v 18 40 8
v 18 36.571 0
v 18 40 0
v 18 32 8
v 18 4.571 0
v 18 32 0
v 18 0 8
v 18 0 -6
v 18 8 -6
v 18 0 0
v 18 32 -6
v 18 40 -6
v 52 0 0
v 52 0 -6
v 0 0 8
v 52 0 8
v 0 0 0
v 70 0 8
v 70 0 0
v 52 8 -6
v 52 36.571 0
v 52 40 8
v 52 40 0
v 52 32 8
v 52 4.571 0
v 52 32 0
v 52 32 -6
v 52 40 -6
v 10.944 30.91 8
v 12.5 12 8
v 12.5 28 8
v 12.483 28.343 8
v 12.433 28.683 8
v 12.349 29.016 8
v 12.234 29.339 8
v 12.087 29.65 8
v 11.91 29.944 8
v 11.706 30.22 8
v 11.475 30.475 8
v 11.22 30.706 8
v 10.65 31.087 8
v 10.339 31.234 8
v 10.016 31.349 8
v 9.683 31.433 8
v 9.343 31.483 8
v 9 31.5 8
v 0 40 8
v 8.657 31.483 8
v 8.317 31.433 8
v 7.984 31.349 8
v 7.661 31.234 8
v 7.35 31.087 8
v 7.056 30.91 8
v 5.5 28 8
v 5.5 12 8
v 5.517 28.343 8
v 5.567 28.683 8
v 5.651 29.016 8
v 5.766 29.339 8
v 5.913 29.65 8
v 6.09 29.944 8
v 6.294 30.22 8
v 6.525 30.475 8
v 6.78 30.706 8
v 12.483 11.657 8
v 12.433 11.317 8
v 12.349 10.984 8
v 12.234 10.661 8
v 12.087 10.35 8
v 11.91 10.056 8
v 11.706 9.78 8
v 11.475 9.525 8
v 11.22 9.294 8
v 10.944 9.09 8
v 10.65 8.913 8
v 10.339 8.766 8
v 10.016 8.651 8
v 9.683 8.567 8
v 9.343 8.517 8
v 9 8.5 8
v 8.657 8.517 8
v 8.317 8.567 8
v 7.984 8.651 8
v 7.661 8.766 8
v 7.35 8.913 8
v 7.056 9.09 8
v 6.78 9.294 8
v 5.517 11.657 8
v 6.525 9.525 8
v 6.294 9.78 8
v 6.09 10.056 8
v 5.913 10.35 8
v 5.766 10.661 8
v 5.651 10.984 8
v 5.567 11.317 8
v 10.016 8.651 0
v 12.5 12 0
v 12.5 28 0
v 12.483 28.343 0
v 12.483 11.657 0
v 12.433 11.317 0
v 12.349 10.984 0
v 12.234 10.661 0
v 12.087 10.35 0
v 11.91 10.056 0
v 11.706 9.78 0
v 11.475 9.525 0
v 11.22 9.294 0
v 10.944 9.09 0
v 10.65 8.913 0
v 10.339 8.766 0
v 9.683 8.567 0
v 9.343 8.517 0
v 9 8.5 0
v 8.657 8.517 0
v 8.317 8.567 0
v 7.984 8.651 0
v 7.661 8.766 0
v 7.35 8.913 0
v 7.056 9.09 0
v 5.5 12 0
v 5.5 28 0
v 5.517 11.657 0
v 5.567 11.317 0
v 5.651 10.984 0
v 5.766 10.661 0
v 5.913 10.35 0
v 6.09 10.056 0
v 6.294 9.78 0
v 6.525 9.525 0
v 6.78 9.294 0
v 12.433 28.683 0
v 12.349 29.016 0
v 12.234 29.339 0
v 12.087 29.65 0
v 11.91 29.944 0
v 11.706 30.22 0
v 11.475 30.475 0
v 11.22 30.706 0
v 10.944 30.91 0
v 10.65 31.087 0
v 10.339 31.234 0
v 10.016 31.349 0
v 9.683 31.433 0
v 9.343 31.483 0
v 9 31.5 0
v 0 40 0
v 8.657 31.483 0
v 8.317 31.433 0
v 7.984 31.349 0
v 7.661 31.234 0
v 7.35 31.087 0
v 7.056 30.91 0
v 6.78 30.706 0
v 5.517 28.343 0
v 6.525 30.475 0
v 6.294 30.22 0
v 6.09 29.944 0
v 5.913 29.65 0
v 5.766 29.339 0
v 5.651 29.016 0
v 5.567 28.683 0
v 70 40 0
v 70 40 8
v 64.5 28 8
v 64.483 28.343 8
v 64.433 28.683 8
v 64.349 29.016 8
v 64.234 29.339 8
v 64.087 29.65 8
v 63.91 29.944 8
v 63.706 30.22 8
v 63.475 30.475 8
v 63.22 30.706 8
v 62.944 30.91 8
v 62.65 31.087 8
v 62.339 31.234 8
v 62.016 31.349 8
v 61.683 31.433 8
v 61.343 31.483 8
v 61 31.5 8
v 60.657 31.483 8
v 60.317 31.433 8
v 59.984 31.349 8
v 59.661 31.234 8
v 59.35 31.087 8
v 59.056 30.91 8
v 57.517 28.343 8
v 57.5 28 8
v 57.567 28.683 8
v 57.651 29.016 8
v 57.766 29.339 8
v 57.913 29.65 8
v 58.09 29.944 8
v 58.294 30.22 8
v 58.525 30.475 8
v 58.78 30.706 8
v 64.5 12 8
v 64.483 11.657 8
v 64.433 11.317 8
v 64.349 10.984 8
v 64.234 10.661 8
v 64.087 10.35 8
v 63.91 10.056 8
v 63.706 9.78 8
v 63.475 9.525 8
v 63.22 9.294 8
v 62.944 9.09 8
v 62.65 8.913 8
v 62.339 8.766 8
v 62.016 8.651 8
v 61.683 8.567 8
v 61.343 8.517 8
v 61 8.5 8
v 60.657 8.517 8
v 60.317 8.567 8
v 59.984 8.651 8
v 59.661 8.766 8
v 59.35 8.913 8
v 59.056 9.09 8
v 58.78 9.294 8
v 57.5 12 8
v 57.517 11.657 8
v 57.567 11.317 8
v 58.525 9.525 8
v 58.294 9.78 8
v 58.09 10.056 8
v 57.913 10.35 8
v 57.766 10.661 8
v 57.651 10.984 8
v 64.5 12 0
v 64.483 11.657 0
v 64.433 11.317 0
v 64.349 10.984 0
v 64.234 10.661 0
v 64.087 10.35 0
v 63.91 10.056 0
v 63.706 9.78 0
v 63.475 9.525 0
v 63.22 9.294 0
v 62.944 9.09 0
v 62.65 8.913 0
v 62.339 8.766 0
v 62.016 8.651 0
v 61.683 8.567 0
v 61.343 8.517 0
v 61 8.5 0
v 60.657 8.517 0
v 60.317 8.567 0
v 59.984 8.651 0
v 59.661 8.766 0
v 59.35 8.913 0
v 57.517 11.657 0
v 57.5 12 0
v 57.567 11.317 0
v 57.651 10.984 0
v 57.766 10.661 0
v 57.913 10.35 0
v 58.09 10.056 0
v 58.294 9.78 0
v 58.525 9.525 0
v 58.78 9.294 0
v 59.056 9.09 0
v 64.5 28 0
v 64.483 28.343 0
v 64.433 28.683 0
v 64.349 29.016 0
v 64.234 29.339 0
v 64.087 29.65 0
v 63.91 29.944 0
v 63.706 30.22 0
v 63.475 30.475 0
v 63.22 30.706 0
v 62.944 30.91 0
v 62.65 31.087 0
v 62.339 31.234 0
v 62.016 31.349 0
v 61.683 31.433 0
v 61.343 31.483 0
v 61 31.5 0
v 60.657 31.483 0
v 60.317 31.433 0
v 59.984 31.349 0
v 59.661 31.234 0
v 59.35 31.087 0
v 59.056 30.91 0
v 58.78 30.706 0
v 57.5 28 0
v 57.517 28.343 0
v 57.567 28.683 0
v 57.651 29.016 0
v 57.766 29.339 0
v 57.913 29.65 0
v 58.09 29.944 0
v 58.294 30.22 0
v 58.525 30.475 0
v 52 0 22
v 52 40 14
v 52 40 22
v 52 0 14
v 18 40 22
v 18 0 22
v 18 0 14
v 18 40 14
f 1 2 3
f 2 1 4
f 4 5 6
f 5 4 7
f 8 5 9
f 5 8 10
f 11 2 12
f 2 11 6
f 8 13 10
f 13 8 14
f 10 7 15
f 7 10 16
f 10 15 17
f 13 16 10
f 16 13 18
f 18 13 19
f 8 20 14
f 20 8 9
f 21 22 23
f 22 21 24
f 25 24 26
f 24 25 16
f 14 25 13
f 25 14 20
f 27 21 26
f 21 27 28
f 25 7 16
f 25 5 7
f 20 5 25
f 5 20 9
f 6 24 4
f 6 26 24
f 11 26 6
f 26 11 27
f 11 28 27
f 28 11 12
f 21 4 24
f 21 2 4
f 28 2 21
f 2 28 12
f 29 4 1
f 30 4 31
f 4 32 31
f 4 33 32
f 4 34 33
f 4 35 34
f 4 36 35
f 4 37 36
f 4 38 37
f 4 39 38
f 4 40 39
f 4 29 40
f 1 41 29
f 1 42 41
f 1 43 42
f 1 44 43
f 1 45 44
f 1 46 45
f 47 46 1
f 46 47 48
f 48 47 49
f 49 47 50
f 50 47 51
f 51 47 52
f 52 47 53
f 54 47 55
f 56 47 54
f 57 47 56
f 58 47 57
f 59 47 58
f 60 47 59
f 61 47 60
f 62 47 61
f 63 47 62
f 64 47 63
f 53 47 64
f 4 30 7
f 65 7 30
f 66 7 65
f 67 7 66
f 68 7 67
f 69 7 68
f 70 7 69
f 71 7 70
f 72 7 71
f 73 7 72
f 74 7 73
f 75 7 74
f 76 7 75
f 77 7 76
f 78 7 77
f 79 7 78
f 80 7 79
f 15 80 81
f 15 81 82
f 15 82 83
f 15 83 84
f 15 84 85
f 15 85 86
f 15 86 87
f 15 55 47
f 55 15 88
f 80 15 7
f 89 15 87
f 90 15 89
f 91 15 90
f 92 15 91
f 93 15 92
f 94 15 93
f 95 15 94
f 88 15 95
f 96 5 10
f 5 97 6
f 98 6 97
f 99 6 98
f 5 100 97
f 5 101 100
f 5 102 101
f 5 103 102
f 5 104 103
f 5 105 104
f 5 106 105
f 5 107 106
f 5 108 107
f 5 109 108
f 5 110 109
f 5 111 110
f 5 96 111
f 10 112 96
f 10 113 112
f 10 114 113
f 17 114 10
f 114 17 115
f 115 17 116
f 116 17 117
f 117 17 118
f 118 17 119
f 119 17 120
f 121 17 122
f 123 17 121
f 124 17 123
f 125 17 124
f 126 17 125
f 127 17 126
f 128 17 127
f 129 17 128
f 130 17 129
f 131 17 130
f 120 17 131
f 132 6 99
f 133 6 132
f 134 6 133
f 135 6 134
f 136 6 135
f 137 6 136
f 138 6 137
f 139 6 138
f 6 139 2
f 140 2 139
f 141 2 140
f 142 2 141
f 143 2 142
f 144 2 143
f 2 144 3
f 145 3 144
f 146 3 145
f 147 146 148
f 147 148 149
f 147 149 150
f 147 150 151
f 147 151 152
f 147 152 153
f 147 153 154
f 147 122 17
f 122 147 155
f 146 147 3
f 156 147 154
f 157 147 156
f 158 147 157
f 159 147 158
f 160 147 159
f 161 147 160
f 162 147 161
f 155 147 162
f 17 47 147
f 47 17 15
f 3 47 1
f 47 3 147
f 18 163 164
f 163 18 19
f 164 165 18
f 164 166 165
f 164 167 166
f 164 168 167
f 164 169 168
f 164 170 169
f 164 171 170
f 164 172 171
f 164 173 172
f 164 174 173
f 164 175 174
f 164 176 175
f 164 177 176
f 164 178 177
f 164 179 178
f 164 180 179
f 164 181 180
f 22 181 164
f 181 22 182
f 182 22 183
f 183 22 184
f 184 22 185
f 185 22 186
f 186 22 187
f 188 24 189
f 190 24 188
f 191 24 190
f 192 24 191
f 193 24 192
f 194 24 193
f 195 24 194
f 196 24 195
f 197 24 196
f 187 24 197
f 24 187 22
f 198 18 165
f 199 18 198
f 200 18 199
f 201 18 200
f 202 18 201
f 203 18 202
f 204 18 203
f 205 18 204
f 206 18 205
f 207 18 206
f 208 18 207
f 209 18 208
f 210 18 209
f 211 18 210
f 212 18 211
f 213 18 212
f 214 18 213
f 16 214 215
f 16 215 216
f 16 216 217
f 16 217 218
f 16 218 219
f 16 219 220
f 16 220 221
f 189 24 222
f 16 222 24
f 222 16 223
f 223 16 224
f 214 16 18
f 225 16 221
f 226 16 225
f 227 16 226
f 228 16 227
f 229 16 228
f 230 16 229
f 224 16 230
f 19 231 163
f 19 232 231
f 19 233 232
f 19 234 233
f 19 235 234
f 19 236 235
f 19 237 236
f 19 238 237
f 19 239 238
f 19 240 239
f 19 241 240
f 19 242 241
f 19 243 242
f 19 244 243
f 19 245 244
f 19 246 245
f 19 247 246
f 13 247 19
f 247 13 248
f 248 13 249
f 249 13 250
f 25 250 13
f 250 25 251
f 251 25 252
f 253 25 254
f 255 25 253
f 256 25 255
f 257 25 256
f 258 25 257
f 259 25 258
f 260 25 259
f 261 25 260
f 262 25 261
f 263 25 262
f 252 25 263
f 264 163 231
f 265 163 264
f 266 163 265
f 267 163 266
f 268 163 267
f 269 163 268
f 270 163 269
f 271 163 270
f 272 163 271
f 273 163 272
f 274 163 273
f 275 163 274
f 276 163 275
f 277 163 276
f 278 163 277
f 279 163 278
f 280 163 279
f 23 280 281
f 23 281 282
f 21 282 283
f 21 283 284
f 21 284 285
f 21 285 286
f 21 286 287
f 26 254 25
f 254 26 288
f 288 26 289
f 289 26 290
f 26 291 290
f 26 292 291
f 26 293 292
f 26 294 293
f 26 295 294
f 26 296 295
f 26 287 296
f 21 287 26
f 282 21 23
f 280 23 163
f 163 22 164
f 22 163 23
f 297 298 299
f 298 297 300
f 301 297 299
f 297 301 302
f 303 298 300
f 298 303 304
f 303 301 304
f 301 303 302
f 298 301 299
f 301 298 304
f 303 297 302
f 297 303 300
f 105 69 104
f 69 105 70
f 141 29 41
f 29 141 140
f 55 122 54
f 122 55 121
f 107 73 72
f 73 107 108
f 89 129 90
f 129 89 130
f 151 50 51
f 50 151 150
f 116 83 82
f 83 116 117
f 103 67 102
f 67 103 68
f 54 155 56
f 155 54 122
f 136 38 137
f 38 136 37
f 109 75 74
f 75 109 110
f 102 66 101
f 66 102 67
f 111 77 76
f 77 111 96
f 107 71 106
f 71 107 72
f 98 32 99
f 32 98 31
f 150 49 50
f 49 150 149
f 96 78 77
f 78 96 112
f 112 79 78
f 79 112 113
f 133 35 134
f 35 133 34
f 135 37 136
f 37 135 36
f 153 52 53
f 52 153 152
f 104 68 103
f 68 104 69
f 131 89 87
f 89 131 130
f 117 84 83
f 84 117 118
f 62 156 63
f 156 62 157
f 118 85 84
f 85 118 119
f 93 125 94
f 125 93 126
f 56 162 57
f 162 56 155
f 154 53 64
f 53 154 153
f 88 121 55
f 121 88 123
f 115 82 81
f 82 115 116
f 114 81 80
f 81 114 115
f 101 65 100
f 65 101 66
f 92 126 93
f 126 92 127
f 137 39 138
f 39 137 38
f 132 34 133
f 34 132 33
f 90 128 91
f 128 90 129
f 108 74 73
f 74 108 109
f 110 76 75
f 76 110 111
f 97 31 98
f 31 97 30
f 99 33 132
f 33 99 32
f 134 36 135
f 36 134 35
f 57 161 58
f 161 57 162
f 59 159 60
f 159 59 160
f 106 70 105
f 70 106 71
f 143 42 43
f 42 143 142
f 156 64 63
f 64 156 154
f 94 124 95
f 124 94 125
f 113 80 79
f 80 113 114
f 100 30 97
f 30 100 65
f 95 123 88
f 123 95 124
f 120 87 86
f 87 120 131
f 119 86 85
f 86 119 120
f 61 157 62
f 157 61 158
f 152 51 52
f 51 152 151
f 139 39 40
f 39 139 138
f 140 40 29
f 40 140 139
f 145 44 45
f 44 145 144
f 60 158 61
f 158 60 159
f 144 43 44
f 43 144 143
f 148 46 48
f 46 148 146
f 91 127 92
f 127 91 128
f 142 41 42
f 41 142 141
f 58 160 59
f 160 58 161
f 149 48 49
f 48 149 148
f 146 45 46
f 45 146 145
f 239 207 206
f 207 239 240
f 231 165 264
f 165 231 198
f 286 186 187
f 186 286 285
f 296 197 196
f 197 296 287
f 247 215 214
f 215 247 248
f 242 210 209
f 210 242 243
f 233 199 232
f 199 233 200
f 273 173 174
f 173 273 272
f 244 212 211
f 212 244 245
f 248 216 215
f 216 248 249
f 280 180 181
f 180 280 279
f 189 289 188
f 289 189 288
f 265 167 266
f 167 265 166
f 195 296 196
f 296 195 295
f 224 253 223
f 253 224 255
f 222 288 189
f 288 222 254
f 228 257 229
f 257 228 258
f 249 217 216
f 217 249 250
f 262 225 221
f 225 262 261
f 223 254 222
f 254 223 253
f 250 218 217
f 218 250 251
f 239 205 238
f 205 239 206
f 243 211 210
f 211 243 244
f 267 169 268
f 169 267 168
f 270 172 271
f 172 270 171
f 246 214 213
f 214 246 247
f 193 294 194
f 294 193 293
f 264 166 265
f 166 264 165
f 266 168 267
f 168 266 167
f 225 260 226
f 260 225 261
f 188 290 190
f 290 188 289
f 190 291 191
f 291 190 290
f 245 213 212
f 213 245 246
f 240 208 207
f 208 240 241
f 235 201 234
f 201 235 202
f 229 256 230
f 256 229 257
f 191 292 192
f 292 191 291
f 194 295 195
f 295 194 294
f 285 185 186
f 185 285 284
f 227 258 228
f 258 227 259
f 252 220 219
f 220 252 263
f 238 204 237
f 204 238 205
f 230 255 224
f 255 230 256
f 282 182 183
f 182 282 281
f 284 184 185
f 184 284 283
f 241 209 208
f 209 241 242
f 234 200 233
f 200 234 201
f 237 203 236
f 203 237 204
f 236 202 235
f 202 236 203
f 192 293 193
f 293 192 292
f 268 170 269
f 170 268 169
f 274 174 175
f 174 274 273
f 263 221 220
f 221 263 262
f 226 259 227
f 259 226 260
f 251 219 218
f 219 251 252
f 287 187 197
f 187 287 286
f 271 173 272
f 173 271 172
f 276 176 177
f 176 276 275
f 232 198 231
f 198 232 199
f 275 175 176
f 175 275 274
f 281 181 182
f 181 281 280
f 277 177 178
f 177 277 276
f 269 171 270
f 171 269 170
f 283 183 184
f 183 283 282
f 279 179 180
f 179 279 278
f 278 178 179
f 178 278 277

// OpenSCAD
// Original MechIntel educational model. CC0-1.0. Units: mm.
// Not a standardized or load-rated component.
$fn=96;
span=70; foot=18; strap=8; rise=22; depth=40; slot=7;
$fn=64;
difference(){
 union(){
  cube([foot,depth,strap]);
  translate([span-foot,0,0]) cube([foot,depth,strap]);
  translate([foot,0,rise-strap]) cube([span-2*foot,depth,strap]);
  for(y=[0,depth-strap]) translate([foot,y,strap]) rotate([0,90,0]) linear_extrude(height=span-2*foot) polygon([[0,0],[rise-strap,0],[rise-strap,strap]]);
 }
 for(x=[foot/2,span-foot/2]) hull(){translate([x,depth/2-8,-1]) cylinder(d=slot,h=strap+2);translate([x,depth/2+8,-1]) cylinder(d=slot,h=strap+2);}
}
